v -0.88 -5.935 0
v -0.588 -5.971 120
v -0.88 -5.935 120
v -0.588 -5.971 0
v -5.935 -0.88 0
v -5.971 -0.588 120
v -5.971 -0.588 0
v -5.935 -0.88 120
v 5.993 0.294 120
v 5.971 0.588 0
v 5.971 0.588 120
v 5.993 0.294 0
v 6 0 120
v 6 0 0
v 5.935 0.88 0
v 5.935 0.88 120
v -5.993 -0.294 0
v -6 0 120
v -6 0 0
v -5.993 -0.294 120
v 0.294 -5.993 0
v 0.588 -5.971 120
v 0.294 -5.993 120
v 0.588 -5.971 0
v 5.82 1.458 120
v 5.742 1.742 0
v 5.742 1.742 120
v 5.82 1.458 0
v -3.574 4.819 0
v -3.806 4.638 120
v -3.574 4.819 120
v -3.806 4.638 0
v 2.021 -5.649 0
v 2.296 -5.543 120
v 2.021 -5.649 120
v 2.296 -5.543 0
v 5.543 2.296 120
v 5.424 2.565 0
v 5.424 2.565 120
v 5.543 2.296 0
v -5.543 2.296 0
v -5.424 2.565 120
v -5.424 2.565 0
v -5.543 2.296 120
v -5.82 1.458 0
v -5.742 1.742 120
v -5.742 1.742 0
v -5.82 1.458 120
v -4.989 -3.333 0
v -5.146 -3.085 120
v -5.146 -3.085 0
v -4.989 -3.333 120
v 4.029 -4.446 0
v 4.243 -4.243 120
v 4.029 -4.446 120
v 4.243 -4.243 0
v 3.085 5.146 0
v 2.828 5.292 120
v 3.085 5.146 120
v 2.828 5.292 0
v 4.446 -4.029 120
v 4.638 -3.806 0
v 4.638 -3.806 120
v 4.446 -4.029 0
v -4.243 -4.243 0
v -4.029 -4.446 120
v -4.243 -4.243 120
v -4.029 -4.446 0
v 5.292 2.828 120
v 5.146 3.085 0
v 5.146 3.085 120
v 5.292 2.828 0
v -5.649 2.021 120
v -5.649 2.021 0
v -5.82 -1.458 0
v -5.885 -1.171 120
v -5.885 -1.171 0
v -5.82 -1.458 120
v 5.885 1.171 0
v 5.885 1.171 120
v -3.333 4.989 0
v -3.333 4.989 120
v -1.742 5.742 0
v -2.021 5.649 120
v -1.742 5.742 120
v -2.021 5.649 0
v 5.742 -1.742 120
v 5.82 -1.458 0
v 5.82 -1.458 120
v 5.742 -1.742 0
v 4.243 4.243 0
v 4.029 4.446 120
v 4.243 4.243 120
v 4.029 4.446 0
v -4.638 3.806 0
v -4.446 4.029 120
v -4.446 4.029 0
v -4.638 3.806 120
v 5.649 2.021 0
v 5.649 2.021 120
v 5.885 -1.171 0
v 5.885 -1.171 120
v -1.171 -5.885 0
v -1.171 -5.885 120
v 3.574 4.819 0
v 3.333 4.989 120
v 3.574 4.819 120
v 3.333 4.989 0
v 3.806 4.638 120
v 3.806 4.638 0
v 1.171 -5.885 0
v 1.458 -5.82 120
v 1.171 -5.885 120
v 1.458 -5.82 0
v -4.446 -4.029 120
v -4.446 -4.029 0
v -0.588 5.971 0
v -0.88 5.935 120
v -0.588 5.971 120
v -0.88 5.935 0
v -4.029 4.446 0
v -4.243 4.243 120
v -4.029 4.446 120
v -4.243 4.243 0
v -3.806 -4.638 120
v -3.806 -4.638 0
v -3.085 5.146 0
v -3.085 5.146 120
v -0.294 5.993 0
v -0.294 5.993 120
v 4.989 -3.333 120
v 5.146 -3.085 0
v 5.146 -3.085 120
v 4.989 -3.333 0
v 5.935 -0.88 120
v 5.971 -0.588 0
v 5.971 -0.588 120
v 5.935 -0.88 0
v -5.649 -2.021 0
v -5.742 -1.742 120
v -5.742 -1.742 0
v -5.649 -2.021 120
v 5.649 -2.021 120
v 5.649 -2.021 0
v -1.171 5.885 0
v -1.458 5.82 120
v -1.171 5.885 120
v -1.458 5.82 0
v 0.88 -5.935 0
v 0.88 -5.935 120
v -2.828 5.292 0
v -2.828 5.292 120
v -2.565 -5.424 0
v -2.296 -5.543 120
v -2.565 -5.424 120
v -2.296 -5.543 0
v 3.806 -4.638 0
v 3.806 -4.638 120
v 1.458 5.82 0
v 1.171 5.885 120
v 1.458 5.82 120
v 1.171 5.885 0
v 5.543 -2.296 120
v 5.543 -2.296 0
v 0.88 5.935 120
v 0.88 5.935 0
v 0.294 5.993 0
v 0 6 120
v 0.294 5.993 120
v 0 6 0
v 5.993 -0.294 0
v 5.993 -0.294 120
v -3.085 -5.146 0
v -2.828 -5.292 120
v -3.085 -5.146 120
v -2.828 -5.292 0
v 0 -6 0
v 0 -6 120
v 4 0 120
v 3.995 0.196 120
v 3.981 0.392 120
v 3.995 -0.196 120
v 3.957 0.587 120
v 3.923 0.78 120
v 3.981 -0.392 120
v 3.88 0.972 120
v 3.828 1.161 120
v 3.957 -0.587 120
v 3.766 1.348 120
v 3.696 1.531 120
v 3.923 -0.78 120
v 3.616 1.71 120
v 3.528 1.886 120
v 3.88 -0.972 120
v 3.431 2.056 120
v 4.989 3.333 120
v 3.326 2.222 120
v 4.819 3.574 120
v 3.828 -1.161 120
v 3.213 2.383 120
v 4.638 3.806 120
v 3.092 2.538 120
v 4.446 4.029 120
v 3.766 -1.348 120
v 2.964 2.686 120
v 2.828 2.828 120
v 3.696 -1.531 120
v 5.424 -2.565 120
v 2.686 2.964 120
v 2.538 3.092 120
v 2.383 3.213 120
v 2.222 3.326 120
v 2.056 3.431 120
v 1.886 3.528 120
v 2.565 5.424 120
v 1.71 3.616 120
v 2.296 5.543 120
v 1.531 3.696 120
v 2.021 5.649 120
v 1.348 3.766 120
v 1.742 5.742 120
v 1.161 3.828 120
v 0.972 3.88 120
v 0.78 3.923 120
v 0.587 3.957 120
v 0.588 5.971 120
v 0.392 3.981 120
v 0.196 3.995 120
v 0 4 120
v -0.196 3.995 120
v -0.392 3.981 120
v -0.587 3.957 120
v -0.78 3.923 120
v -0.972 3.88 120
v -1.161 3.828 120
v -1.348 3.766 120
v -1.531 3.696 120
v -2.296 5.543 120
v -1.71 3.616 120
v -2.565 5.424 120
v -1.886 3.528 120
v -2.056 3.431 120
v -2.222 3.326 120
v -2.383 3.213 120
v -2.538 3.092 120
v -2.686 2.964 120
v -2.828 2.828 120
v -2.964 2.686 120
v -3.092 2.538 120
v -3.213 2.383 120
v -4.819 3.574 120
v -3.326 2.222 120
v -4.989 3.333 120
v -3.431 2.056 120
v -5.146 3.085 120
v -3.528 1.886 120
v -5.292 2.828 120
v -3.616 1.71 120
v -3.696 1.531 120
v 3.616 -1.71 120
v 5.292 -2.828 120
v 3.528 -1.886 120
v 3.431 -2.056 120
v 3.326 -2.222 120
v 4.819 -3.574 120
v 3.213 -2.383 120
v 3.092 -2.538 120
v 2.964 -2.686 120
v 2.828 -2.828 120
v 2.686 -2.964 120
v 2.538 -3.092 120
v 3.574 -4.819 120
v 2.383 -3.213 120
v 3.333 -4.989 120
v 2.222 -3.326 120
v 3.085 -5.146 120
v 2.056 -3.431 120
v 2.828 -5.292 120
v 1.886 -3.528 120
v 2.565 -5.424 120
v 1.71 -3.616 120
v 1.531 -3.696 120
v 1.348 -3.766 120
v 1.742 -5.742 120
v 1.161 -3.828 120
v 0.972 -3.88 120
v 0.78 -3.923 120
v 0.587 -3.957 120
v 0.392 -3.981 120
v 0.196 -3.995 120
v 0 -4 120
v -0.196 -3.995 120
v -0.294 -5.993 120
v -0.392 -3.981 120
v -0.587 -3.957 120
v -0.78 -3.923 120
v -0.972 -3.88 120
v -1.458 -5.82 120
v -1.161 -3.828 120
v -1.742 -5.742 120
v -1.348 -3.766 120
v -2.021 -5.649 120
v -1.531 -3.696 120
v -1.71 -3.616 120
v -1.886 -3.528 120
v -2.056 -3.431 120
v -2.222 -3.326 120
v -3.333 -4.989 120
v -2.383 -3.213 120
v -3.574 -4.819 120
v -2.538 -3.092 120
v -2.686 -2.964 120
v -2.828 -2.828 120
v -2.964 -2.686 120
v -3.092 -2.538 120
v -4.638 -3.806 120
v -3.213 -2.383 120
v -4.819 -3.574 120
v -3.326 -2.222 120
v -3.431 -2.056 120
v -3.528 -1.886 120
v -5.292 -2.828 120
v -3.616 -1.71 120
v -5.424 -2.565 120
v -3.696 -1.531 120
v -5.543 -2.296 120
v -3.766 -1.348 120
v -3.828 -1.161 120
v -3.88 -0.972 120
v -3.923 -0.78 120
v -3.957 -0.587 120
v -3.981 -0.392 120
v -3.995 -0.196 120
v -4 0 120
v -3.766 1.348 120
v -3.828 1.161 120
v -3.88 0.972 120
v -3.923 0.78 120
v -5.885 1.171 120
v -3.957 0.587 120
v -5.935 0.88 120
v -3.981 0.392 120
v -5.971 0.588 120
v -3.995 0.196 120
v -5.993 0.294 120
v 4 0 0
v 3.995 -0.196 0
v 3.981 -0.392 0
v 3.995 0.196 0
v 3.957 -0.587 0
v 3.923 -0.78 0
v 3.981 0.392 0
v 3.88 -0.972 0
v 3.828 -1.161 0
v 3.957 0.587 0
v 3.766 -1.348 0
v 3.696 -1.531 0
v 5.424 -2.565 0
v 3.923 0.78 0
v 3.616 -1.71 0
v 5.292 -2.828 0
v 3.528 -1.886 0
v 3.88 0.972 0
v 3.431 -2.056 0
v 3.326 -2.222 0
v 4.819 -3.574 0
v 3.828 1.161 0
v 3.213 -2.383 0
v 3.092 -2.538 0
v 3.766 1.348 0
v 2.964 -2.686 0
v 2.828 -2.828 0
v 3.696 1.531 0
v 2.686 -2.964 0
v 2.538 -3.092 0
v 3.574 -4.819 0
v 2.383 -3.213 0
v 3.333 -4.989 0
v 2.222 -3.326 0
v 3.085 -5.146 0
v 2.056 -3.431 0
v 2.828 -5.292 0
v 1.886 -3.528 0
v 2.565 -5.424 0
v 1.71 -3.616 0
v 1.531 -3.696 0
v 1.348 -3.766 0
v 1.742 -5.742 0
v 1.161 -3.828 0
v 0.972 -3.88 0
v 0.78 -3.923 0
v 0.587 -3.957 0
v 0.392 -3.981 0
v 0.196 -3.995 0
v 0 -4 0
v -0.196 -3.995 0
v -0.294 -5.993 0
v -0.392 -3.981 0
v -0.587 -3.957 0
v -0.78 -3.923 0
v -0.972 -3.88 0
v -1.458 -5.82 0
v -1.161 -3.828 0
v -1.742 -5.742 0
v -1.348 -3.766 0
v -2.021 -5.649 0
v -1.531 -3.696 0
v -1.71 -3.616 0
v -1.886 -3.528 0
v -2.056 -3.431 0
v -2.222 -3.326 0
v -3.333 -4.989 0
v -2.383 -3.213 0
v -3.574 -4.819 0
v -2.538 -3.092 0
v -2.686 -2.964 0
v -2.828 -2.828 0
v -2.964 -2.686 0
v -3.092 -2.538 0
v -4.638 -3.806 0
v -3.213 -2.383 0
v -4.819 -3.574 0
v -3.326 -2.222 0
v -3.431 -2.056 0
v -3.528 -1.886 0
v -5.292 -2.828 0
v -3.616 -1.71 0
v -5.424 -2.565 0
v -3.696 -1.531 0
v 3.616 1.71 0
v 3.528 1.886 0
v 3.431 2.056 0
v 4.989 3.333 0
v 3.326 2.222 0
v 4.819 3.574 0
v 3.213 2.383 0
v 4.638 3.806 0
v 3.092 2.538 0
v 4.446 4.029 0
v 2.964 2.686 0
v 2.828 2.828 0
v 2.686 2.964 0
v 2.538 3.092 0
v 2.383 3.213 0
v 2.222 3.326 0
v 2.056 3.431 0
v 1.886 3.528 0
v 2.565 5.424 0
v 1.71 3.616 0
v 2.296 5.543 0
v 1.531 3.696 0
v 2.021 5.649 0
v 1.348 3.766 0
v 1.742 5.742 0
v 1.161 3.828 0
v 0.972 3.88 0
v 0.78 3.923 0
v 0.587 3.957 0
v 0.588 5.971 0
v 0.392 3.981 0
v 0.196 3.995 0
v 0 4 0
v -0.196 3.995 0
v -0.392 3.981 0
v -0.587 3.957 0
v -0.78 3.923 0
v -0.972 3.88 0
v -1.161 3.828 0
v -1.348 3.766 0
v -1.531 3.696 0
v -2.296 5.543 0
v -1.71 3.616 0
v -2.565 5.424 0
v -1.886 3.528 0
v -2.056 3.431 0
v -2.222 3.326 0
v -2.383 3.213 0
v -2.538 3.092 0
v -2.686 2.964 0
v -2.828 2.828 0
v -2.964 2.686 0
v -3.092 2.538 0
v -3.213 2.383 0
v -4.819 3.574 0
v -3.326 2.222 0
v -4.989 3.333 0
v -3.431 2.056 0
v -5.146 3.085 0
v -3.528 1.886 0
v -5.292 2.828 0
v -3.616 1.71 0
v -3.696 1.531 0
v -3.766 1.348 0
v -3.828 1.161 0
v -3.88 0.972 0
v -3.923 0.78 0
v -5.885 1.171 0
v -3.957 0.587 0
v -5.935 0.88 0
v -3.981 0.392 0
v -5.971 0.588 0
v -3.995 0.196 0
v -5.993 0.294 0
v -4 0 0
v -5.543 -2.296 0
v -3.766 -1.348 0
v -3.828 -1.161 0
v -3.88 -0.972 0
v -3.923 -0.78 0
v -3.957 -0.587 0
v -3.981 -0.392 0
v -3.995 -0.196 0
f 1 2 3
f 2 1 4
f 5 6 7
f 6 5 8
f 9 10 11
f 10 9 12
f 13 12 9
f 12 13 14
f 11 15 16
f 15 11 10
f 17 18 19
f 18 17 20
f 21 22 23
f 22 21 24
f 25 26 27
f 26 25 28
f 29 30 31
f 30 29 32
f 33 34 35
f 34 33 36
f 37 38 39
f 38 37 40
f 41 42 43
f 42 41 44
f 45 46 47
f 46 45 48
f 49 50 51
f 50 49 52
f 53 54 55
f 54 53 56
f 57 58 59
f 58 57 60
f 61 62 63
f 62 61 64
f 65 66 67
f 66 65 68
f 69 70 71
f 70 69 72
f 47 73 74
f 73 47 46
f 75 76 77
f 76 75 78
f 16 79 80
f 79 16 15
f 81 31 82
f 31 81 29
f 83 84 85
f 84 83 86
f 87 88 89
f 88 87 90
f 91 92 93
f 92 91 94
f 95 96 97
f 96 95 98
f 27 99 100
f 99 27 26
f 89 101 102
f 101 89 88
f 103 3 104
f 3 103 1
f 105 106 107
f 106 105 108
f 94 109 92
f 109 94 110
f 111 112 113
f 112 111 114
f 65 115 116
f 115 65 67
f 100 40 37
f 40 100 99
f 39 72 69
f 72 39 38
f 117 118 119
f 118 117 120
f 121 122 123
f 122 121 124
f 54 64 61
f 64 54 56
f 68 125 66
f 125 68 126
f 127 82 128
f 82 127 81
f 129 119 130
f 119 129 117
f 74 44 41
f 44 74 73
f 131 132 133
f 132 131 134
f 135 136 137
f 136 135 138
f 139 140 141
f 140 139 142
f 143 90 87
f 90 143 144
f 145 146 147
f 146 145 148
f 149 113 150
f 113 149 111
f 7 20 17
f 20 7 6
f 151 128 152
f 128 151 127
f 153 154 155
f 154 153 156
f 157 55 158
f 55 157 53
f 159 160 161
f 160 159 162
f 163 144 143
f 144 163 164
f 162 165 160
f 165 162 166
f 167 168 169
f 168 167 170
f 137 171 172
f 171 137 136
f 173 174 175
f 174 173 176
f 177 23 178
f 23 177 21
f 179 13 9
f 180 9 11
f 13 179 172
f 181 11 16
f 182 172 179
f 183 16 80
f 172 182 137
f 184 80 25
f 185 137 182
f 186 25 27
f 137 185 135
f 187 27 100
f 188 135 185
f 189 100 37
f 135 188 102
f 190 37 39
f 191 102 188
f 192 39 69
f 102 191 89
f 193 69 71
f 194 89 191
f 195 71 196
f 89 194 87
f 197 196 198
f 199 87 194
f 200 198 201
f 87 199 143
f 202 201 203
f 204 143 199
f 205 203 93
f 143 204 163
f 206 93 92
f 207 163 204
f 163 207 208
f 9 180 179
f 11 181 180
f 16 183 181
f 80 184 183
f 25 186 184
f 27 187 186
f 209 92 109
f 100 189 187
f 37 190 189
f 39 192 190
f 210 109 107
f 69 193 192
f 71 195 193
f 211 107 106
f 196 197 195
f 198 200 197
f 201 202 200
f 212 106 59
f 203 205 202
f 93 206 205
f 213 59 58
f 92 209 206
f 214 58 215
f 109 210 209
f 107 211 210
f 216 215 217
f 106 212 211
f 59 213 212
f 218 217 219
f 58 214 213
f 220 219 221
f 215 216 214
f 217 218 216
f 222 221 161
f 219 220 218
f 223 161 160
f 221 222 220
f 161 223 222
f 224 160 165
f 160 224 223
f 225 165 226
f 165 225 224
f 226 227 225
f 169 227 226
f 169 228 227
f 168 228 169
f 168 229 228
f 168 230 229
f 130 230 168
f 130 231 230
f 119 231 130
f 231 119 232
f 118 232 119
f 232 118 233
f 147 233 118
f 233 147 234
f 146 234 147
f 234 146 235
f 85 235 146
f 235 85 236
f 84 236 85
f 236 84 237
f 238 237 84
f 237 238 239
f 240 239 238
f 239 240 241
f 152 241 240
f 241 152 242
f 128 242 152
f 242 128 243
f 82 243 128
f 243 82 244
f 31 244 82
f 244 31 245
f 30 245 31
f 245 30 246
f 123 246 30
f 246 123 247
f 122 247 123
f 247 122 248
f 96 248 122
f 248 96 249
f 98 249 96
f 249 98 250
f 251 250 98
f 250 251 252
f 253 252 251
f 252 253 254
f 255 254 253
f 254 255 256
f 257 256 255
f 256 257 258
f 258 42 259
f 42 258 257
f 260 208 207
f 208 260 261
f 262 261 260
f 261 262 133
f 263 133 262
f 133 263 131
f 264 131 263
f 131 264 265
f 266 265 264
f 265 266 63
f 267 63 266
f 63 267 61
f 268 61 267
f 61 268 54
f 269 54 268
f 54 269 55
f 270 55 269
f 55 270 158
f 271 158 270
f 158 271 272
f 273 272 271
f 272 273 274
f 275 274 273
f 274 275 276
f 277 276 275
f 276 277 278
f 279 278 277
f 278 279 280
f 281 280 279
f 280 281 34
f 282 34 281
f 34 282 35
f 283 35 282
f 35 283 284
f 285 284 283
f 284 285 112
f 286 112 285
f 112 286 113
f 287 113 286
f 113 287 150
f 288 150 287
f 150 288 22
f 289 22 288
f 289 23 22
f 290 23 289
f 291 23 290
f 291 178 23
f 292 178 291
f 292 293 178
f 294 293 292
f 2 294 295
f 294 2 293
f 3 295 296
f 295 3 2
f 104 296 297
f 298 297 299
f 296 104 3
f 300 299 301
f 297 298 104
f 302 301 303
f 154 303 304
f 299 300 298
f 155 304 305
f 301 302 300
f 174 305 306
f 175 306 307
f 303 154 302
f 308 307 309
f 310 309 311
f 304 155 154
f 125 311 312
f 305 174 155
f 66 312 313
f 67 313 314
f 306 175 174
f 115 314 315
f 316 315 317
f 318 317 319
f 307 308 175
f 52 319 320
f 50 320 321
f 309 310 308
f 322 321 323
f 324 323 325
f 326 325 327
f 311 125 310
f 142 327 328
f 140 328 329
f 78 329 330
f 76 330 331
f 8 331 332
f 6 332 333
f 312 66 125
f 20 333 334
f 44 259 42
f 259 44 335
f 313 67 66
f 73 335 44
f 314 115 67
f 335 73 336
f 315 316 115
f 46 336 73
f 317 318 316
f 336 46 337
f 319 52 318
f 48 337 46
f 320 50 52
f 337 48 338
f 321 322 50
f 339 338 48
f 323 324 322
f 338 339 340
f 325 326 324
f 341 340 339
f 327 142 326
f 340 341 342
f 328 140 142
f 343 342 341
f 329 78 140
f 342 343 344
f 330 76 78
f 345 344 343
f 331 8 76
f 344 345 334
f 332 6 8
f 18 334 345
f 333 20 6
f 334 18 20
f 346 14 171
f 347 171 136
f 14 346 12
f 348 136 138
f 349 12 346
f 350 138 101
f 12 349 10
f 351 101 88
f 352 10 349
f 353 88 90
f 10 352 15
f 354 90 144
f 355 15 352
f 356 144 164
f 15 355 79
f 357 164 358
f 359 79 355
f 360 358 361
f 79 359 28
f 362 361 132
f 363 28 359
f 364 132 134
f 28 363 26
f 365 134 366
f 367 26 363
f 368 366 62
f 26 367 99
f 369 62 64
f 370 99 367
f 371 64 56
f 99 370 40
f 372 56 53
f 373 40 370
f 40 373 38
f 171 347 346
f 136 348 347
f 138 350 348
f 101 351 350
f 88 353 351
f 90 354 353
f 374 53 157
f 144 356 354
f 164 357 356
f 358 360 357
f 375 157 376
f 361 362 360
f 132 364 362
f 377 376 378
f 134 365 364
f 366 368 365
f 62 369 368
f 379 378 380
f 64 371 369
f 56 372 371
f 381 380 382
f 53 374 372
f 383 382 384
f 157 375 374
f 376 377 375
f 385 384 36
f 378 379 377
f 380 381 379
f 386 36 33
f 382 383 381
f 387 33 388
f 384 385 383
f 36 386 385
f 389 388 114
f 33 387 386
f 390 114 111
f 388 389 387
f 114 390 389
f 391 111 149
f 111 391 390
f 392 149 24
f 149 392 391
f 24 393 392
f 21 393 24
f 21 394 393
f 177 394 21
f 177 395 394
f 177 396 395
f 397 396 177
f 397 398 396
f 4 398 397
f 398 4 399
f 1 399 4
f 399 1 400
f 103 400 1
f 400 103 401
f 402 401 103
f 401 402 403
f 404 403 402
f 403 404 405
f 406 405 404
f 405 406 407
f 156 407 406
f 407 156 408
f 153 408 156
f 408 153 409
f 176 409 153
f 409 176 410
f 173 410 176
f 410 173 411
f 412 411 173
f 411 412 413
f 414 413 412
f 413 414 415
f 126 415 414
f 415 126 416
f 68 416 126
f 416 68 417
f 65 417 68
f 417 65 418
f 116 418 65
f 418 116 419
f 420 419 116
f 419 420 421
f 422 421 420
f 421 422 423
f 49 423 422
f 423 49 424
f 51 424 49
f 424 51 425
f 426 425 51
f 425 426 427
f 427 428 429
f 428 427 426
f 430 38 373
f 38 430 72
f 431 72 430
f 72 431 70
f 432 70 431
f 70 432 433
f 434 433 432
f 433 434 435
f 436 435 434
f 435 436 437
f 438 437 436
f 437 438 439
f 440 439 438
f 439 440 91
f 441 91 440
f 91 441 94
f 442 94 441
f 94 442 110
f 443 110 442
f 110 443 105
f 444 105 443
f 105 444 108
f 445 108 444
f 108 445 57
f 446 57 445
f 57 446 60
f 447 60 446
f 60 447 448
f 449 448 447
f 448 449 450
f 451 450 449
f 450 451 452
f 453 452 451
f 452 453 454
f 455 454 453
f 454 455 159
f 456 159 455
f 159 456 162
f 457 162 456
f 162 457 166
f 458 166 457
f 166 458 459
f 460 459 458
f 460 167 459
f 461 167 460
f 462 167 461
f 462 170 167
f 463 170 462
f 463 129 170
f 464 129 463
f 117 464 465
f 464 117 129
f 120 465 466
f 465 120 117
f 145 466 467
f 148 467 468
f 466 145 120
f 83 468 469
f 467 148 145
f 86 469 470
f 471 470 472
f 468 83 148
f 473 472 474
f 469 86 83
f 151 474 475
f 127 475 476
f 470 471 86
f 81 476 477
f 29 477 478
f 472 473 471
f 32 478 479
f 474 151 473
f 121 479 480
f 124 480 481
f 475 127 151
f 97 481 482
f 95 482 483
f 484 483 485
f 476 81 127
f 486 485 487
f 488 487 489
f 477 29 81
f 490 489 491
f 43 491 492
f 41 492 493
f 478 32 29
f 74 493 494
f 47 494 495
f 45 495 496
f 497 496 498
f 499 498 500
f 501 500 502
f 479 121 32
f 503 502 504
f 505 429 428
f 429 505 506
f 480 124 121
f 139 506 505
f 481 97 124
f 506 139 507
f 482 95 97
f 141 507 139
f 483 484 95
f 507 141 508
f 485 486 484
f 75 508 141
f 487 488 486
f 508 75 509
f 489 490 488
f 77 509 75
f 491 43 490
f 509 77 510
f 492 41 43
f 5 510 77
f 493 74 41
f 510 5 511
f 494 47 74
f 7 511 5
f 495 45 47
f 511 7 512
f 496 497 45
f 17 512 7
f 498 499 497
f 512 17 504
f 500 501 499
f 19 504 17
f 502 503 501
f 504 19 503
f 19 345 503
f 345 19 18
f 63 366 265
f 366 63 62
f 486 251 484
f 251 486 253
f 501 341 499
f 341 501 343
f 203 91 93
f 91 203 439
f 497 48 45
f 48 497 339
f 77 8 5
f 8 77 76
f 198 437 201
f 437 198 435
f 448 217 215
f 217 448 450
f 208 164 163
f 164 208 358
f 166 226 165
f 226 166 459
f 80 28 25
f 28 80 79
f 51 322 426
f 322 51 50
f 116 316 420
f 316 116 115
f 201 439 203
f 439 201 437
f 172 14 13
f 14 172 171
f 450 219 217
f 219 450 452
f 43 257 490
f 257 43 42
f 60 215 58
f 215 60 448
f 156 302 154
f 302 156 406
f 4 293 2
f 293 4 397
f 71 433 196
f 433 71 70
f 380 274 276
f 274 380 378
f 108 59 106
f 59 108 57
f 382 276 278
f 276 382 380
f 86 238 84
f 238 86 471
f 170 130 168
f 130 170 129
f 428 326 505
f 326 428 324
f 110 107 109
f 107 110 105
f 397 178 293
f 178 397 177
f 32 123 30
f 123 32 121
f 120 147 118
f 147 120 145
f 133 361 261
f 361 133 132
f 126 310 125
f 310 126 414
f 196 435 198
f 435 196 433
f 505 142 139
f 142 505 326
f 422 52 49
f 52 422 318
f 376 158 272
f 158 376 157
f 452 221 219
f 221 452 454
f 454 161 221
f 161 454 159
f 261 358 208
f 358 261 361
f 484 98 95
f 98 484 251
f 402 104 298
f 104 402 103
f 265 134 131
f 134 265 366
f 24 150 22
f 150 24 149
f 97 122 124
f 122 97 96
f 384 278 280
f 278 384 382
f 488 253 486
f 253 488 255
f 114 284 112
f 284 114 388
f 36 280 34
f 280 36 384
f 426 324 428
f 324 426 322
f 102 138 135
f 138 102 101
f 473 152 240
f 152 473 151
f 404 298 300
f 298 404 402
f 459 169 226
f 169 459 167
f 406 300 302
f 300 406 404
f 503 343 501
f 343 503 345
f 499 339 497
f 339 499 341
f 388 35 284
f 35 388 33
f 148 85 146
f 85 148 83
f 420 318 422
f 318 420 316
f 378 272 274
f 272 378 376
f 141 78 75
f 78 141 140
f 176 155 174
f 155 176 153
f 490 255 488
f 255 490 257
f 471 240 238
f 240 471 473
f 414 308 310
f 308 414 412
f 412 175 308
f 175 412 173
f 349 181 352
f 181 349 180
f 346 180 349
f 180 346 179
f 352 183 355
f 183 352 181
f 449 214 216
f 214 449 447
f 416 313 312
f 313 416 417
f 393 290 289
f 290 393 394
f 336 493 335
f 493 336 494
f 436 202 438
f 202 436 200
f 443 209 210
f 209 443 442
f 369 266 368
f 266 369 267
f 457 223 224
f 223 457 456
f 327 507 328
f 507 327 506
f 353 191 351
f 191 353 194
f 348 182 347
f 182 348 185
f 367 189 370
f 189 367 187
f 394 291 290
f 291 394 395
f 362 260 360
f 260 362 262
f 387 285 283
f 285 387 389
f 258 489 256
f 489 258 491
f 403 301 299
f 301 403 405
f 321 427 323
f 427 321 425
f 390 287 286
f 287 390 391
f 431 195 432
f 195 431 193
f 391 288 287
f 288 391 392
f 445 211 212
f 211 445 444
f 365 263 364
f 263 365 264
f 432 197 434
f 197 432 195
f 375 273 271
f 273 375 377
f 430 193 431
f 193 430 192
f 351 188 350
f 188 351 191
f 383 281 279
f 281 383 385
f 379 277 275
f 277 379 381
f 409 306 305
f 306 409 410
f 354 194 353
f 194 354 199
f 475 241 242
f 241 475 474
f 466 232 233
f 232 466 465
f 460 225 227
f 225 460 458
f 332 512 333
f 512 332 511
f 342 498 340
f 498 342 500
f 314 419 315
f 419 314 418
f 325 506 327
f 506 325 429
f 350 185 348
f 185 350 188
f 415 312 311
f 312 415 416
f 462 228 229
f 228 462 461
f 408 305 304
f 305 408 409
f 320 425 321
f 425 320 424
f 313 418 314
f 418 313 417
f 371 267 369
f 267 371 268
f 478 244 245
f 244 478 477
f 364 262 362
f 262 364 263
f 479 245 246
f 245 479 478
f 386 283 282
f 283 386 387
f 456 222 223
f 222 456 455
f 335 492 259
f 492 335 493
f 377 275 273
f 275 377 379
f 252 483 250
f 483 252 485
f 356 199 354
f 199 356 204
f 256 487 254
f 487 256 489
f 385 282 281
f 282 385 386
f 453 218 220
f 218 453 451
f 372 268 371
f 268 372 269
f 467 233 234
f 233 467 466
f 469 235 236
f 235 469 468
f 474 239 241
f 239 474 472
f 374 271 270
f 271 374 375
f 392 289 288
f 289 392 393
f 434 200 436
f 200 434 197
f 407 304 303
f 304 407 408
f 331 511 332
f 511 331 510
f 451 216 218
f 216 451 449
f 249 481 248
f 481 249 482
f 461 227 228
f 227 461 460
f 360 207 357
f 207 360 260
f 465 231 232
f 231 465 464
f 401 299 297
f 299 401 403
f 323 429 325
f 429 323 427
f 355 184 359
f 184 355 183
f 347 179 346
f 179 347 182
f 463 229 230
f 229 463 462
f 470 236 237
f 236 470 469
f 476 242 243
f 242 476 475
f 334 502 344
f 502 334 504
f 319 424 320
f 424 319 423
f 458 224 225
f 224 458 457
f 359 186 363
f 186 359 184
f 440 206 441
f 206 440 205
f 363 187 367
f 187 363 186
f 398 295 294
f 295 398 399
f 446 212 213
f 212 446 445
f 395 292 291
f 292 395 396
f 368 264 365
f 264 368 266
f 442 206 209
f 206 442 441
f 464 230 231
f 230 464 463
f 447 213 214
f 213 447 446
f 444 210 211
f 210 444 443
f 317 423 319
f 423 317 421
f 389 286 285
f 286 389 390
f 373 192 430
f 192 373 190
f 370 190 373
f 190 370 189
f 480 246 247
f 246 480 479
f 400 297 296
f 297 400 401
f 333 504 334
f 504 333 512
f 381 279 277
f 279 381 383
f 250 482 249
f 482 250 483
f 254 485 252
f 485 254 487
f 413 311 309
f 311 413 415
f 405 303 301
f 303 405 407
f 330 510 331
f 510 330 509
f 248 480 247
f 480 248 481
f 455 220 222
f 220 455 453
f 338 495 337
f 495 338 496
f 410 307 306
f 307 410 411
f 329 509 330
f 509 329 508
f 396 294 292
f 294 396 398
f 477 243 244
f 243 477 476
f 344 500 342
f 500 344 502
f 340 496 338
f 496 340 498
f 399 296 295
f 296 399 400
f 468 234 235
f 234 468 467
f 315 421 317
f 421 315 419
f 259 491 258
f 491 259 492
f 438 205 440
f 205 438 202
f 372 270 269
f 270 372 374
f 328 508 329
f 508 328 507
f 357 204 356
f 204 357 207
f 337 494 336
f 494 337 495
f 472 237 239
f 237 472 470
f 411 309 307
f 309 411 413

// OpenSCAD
$fn = 128;

// Neoprene tubing (generic): hollow cylinder
// Units: mm

inner_d = 8;      // inner diameter
outer_d = 12;     // outer diameter
length  = 120;    // tube length

module neoprene_tube(od, id, h) {
    difference() {
        cylinder(d=od, h=h, center=false);
        translate([0,0,-0.5])
            cylinder(d=id, h=h+1, center=false);
    }
}

neoprene_tube(outer_d, inner_d, length);
